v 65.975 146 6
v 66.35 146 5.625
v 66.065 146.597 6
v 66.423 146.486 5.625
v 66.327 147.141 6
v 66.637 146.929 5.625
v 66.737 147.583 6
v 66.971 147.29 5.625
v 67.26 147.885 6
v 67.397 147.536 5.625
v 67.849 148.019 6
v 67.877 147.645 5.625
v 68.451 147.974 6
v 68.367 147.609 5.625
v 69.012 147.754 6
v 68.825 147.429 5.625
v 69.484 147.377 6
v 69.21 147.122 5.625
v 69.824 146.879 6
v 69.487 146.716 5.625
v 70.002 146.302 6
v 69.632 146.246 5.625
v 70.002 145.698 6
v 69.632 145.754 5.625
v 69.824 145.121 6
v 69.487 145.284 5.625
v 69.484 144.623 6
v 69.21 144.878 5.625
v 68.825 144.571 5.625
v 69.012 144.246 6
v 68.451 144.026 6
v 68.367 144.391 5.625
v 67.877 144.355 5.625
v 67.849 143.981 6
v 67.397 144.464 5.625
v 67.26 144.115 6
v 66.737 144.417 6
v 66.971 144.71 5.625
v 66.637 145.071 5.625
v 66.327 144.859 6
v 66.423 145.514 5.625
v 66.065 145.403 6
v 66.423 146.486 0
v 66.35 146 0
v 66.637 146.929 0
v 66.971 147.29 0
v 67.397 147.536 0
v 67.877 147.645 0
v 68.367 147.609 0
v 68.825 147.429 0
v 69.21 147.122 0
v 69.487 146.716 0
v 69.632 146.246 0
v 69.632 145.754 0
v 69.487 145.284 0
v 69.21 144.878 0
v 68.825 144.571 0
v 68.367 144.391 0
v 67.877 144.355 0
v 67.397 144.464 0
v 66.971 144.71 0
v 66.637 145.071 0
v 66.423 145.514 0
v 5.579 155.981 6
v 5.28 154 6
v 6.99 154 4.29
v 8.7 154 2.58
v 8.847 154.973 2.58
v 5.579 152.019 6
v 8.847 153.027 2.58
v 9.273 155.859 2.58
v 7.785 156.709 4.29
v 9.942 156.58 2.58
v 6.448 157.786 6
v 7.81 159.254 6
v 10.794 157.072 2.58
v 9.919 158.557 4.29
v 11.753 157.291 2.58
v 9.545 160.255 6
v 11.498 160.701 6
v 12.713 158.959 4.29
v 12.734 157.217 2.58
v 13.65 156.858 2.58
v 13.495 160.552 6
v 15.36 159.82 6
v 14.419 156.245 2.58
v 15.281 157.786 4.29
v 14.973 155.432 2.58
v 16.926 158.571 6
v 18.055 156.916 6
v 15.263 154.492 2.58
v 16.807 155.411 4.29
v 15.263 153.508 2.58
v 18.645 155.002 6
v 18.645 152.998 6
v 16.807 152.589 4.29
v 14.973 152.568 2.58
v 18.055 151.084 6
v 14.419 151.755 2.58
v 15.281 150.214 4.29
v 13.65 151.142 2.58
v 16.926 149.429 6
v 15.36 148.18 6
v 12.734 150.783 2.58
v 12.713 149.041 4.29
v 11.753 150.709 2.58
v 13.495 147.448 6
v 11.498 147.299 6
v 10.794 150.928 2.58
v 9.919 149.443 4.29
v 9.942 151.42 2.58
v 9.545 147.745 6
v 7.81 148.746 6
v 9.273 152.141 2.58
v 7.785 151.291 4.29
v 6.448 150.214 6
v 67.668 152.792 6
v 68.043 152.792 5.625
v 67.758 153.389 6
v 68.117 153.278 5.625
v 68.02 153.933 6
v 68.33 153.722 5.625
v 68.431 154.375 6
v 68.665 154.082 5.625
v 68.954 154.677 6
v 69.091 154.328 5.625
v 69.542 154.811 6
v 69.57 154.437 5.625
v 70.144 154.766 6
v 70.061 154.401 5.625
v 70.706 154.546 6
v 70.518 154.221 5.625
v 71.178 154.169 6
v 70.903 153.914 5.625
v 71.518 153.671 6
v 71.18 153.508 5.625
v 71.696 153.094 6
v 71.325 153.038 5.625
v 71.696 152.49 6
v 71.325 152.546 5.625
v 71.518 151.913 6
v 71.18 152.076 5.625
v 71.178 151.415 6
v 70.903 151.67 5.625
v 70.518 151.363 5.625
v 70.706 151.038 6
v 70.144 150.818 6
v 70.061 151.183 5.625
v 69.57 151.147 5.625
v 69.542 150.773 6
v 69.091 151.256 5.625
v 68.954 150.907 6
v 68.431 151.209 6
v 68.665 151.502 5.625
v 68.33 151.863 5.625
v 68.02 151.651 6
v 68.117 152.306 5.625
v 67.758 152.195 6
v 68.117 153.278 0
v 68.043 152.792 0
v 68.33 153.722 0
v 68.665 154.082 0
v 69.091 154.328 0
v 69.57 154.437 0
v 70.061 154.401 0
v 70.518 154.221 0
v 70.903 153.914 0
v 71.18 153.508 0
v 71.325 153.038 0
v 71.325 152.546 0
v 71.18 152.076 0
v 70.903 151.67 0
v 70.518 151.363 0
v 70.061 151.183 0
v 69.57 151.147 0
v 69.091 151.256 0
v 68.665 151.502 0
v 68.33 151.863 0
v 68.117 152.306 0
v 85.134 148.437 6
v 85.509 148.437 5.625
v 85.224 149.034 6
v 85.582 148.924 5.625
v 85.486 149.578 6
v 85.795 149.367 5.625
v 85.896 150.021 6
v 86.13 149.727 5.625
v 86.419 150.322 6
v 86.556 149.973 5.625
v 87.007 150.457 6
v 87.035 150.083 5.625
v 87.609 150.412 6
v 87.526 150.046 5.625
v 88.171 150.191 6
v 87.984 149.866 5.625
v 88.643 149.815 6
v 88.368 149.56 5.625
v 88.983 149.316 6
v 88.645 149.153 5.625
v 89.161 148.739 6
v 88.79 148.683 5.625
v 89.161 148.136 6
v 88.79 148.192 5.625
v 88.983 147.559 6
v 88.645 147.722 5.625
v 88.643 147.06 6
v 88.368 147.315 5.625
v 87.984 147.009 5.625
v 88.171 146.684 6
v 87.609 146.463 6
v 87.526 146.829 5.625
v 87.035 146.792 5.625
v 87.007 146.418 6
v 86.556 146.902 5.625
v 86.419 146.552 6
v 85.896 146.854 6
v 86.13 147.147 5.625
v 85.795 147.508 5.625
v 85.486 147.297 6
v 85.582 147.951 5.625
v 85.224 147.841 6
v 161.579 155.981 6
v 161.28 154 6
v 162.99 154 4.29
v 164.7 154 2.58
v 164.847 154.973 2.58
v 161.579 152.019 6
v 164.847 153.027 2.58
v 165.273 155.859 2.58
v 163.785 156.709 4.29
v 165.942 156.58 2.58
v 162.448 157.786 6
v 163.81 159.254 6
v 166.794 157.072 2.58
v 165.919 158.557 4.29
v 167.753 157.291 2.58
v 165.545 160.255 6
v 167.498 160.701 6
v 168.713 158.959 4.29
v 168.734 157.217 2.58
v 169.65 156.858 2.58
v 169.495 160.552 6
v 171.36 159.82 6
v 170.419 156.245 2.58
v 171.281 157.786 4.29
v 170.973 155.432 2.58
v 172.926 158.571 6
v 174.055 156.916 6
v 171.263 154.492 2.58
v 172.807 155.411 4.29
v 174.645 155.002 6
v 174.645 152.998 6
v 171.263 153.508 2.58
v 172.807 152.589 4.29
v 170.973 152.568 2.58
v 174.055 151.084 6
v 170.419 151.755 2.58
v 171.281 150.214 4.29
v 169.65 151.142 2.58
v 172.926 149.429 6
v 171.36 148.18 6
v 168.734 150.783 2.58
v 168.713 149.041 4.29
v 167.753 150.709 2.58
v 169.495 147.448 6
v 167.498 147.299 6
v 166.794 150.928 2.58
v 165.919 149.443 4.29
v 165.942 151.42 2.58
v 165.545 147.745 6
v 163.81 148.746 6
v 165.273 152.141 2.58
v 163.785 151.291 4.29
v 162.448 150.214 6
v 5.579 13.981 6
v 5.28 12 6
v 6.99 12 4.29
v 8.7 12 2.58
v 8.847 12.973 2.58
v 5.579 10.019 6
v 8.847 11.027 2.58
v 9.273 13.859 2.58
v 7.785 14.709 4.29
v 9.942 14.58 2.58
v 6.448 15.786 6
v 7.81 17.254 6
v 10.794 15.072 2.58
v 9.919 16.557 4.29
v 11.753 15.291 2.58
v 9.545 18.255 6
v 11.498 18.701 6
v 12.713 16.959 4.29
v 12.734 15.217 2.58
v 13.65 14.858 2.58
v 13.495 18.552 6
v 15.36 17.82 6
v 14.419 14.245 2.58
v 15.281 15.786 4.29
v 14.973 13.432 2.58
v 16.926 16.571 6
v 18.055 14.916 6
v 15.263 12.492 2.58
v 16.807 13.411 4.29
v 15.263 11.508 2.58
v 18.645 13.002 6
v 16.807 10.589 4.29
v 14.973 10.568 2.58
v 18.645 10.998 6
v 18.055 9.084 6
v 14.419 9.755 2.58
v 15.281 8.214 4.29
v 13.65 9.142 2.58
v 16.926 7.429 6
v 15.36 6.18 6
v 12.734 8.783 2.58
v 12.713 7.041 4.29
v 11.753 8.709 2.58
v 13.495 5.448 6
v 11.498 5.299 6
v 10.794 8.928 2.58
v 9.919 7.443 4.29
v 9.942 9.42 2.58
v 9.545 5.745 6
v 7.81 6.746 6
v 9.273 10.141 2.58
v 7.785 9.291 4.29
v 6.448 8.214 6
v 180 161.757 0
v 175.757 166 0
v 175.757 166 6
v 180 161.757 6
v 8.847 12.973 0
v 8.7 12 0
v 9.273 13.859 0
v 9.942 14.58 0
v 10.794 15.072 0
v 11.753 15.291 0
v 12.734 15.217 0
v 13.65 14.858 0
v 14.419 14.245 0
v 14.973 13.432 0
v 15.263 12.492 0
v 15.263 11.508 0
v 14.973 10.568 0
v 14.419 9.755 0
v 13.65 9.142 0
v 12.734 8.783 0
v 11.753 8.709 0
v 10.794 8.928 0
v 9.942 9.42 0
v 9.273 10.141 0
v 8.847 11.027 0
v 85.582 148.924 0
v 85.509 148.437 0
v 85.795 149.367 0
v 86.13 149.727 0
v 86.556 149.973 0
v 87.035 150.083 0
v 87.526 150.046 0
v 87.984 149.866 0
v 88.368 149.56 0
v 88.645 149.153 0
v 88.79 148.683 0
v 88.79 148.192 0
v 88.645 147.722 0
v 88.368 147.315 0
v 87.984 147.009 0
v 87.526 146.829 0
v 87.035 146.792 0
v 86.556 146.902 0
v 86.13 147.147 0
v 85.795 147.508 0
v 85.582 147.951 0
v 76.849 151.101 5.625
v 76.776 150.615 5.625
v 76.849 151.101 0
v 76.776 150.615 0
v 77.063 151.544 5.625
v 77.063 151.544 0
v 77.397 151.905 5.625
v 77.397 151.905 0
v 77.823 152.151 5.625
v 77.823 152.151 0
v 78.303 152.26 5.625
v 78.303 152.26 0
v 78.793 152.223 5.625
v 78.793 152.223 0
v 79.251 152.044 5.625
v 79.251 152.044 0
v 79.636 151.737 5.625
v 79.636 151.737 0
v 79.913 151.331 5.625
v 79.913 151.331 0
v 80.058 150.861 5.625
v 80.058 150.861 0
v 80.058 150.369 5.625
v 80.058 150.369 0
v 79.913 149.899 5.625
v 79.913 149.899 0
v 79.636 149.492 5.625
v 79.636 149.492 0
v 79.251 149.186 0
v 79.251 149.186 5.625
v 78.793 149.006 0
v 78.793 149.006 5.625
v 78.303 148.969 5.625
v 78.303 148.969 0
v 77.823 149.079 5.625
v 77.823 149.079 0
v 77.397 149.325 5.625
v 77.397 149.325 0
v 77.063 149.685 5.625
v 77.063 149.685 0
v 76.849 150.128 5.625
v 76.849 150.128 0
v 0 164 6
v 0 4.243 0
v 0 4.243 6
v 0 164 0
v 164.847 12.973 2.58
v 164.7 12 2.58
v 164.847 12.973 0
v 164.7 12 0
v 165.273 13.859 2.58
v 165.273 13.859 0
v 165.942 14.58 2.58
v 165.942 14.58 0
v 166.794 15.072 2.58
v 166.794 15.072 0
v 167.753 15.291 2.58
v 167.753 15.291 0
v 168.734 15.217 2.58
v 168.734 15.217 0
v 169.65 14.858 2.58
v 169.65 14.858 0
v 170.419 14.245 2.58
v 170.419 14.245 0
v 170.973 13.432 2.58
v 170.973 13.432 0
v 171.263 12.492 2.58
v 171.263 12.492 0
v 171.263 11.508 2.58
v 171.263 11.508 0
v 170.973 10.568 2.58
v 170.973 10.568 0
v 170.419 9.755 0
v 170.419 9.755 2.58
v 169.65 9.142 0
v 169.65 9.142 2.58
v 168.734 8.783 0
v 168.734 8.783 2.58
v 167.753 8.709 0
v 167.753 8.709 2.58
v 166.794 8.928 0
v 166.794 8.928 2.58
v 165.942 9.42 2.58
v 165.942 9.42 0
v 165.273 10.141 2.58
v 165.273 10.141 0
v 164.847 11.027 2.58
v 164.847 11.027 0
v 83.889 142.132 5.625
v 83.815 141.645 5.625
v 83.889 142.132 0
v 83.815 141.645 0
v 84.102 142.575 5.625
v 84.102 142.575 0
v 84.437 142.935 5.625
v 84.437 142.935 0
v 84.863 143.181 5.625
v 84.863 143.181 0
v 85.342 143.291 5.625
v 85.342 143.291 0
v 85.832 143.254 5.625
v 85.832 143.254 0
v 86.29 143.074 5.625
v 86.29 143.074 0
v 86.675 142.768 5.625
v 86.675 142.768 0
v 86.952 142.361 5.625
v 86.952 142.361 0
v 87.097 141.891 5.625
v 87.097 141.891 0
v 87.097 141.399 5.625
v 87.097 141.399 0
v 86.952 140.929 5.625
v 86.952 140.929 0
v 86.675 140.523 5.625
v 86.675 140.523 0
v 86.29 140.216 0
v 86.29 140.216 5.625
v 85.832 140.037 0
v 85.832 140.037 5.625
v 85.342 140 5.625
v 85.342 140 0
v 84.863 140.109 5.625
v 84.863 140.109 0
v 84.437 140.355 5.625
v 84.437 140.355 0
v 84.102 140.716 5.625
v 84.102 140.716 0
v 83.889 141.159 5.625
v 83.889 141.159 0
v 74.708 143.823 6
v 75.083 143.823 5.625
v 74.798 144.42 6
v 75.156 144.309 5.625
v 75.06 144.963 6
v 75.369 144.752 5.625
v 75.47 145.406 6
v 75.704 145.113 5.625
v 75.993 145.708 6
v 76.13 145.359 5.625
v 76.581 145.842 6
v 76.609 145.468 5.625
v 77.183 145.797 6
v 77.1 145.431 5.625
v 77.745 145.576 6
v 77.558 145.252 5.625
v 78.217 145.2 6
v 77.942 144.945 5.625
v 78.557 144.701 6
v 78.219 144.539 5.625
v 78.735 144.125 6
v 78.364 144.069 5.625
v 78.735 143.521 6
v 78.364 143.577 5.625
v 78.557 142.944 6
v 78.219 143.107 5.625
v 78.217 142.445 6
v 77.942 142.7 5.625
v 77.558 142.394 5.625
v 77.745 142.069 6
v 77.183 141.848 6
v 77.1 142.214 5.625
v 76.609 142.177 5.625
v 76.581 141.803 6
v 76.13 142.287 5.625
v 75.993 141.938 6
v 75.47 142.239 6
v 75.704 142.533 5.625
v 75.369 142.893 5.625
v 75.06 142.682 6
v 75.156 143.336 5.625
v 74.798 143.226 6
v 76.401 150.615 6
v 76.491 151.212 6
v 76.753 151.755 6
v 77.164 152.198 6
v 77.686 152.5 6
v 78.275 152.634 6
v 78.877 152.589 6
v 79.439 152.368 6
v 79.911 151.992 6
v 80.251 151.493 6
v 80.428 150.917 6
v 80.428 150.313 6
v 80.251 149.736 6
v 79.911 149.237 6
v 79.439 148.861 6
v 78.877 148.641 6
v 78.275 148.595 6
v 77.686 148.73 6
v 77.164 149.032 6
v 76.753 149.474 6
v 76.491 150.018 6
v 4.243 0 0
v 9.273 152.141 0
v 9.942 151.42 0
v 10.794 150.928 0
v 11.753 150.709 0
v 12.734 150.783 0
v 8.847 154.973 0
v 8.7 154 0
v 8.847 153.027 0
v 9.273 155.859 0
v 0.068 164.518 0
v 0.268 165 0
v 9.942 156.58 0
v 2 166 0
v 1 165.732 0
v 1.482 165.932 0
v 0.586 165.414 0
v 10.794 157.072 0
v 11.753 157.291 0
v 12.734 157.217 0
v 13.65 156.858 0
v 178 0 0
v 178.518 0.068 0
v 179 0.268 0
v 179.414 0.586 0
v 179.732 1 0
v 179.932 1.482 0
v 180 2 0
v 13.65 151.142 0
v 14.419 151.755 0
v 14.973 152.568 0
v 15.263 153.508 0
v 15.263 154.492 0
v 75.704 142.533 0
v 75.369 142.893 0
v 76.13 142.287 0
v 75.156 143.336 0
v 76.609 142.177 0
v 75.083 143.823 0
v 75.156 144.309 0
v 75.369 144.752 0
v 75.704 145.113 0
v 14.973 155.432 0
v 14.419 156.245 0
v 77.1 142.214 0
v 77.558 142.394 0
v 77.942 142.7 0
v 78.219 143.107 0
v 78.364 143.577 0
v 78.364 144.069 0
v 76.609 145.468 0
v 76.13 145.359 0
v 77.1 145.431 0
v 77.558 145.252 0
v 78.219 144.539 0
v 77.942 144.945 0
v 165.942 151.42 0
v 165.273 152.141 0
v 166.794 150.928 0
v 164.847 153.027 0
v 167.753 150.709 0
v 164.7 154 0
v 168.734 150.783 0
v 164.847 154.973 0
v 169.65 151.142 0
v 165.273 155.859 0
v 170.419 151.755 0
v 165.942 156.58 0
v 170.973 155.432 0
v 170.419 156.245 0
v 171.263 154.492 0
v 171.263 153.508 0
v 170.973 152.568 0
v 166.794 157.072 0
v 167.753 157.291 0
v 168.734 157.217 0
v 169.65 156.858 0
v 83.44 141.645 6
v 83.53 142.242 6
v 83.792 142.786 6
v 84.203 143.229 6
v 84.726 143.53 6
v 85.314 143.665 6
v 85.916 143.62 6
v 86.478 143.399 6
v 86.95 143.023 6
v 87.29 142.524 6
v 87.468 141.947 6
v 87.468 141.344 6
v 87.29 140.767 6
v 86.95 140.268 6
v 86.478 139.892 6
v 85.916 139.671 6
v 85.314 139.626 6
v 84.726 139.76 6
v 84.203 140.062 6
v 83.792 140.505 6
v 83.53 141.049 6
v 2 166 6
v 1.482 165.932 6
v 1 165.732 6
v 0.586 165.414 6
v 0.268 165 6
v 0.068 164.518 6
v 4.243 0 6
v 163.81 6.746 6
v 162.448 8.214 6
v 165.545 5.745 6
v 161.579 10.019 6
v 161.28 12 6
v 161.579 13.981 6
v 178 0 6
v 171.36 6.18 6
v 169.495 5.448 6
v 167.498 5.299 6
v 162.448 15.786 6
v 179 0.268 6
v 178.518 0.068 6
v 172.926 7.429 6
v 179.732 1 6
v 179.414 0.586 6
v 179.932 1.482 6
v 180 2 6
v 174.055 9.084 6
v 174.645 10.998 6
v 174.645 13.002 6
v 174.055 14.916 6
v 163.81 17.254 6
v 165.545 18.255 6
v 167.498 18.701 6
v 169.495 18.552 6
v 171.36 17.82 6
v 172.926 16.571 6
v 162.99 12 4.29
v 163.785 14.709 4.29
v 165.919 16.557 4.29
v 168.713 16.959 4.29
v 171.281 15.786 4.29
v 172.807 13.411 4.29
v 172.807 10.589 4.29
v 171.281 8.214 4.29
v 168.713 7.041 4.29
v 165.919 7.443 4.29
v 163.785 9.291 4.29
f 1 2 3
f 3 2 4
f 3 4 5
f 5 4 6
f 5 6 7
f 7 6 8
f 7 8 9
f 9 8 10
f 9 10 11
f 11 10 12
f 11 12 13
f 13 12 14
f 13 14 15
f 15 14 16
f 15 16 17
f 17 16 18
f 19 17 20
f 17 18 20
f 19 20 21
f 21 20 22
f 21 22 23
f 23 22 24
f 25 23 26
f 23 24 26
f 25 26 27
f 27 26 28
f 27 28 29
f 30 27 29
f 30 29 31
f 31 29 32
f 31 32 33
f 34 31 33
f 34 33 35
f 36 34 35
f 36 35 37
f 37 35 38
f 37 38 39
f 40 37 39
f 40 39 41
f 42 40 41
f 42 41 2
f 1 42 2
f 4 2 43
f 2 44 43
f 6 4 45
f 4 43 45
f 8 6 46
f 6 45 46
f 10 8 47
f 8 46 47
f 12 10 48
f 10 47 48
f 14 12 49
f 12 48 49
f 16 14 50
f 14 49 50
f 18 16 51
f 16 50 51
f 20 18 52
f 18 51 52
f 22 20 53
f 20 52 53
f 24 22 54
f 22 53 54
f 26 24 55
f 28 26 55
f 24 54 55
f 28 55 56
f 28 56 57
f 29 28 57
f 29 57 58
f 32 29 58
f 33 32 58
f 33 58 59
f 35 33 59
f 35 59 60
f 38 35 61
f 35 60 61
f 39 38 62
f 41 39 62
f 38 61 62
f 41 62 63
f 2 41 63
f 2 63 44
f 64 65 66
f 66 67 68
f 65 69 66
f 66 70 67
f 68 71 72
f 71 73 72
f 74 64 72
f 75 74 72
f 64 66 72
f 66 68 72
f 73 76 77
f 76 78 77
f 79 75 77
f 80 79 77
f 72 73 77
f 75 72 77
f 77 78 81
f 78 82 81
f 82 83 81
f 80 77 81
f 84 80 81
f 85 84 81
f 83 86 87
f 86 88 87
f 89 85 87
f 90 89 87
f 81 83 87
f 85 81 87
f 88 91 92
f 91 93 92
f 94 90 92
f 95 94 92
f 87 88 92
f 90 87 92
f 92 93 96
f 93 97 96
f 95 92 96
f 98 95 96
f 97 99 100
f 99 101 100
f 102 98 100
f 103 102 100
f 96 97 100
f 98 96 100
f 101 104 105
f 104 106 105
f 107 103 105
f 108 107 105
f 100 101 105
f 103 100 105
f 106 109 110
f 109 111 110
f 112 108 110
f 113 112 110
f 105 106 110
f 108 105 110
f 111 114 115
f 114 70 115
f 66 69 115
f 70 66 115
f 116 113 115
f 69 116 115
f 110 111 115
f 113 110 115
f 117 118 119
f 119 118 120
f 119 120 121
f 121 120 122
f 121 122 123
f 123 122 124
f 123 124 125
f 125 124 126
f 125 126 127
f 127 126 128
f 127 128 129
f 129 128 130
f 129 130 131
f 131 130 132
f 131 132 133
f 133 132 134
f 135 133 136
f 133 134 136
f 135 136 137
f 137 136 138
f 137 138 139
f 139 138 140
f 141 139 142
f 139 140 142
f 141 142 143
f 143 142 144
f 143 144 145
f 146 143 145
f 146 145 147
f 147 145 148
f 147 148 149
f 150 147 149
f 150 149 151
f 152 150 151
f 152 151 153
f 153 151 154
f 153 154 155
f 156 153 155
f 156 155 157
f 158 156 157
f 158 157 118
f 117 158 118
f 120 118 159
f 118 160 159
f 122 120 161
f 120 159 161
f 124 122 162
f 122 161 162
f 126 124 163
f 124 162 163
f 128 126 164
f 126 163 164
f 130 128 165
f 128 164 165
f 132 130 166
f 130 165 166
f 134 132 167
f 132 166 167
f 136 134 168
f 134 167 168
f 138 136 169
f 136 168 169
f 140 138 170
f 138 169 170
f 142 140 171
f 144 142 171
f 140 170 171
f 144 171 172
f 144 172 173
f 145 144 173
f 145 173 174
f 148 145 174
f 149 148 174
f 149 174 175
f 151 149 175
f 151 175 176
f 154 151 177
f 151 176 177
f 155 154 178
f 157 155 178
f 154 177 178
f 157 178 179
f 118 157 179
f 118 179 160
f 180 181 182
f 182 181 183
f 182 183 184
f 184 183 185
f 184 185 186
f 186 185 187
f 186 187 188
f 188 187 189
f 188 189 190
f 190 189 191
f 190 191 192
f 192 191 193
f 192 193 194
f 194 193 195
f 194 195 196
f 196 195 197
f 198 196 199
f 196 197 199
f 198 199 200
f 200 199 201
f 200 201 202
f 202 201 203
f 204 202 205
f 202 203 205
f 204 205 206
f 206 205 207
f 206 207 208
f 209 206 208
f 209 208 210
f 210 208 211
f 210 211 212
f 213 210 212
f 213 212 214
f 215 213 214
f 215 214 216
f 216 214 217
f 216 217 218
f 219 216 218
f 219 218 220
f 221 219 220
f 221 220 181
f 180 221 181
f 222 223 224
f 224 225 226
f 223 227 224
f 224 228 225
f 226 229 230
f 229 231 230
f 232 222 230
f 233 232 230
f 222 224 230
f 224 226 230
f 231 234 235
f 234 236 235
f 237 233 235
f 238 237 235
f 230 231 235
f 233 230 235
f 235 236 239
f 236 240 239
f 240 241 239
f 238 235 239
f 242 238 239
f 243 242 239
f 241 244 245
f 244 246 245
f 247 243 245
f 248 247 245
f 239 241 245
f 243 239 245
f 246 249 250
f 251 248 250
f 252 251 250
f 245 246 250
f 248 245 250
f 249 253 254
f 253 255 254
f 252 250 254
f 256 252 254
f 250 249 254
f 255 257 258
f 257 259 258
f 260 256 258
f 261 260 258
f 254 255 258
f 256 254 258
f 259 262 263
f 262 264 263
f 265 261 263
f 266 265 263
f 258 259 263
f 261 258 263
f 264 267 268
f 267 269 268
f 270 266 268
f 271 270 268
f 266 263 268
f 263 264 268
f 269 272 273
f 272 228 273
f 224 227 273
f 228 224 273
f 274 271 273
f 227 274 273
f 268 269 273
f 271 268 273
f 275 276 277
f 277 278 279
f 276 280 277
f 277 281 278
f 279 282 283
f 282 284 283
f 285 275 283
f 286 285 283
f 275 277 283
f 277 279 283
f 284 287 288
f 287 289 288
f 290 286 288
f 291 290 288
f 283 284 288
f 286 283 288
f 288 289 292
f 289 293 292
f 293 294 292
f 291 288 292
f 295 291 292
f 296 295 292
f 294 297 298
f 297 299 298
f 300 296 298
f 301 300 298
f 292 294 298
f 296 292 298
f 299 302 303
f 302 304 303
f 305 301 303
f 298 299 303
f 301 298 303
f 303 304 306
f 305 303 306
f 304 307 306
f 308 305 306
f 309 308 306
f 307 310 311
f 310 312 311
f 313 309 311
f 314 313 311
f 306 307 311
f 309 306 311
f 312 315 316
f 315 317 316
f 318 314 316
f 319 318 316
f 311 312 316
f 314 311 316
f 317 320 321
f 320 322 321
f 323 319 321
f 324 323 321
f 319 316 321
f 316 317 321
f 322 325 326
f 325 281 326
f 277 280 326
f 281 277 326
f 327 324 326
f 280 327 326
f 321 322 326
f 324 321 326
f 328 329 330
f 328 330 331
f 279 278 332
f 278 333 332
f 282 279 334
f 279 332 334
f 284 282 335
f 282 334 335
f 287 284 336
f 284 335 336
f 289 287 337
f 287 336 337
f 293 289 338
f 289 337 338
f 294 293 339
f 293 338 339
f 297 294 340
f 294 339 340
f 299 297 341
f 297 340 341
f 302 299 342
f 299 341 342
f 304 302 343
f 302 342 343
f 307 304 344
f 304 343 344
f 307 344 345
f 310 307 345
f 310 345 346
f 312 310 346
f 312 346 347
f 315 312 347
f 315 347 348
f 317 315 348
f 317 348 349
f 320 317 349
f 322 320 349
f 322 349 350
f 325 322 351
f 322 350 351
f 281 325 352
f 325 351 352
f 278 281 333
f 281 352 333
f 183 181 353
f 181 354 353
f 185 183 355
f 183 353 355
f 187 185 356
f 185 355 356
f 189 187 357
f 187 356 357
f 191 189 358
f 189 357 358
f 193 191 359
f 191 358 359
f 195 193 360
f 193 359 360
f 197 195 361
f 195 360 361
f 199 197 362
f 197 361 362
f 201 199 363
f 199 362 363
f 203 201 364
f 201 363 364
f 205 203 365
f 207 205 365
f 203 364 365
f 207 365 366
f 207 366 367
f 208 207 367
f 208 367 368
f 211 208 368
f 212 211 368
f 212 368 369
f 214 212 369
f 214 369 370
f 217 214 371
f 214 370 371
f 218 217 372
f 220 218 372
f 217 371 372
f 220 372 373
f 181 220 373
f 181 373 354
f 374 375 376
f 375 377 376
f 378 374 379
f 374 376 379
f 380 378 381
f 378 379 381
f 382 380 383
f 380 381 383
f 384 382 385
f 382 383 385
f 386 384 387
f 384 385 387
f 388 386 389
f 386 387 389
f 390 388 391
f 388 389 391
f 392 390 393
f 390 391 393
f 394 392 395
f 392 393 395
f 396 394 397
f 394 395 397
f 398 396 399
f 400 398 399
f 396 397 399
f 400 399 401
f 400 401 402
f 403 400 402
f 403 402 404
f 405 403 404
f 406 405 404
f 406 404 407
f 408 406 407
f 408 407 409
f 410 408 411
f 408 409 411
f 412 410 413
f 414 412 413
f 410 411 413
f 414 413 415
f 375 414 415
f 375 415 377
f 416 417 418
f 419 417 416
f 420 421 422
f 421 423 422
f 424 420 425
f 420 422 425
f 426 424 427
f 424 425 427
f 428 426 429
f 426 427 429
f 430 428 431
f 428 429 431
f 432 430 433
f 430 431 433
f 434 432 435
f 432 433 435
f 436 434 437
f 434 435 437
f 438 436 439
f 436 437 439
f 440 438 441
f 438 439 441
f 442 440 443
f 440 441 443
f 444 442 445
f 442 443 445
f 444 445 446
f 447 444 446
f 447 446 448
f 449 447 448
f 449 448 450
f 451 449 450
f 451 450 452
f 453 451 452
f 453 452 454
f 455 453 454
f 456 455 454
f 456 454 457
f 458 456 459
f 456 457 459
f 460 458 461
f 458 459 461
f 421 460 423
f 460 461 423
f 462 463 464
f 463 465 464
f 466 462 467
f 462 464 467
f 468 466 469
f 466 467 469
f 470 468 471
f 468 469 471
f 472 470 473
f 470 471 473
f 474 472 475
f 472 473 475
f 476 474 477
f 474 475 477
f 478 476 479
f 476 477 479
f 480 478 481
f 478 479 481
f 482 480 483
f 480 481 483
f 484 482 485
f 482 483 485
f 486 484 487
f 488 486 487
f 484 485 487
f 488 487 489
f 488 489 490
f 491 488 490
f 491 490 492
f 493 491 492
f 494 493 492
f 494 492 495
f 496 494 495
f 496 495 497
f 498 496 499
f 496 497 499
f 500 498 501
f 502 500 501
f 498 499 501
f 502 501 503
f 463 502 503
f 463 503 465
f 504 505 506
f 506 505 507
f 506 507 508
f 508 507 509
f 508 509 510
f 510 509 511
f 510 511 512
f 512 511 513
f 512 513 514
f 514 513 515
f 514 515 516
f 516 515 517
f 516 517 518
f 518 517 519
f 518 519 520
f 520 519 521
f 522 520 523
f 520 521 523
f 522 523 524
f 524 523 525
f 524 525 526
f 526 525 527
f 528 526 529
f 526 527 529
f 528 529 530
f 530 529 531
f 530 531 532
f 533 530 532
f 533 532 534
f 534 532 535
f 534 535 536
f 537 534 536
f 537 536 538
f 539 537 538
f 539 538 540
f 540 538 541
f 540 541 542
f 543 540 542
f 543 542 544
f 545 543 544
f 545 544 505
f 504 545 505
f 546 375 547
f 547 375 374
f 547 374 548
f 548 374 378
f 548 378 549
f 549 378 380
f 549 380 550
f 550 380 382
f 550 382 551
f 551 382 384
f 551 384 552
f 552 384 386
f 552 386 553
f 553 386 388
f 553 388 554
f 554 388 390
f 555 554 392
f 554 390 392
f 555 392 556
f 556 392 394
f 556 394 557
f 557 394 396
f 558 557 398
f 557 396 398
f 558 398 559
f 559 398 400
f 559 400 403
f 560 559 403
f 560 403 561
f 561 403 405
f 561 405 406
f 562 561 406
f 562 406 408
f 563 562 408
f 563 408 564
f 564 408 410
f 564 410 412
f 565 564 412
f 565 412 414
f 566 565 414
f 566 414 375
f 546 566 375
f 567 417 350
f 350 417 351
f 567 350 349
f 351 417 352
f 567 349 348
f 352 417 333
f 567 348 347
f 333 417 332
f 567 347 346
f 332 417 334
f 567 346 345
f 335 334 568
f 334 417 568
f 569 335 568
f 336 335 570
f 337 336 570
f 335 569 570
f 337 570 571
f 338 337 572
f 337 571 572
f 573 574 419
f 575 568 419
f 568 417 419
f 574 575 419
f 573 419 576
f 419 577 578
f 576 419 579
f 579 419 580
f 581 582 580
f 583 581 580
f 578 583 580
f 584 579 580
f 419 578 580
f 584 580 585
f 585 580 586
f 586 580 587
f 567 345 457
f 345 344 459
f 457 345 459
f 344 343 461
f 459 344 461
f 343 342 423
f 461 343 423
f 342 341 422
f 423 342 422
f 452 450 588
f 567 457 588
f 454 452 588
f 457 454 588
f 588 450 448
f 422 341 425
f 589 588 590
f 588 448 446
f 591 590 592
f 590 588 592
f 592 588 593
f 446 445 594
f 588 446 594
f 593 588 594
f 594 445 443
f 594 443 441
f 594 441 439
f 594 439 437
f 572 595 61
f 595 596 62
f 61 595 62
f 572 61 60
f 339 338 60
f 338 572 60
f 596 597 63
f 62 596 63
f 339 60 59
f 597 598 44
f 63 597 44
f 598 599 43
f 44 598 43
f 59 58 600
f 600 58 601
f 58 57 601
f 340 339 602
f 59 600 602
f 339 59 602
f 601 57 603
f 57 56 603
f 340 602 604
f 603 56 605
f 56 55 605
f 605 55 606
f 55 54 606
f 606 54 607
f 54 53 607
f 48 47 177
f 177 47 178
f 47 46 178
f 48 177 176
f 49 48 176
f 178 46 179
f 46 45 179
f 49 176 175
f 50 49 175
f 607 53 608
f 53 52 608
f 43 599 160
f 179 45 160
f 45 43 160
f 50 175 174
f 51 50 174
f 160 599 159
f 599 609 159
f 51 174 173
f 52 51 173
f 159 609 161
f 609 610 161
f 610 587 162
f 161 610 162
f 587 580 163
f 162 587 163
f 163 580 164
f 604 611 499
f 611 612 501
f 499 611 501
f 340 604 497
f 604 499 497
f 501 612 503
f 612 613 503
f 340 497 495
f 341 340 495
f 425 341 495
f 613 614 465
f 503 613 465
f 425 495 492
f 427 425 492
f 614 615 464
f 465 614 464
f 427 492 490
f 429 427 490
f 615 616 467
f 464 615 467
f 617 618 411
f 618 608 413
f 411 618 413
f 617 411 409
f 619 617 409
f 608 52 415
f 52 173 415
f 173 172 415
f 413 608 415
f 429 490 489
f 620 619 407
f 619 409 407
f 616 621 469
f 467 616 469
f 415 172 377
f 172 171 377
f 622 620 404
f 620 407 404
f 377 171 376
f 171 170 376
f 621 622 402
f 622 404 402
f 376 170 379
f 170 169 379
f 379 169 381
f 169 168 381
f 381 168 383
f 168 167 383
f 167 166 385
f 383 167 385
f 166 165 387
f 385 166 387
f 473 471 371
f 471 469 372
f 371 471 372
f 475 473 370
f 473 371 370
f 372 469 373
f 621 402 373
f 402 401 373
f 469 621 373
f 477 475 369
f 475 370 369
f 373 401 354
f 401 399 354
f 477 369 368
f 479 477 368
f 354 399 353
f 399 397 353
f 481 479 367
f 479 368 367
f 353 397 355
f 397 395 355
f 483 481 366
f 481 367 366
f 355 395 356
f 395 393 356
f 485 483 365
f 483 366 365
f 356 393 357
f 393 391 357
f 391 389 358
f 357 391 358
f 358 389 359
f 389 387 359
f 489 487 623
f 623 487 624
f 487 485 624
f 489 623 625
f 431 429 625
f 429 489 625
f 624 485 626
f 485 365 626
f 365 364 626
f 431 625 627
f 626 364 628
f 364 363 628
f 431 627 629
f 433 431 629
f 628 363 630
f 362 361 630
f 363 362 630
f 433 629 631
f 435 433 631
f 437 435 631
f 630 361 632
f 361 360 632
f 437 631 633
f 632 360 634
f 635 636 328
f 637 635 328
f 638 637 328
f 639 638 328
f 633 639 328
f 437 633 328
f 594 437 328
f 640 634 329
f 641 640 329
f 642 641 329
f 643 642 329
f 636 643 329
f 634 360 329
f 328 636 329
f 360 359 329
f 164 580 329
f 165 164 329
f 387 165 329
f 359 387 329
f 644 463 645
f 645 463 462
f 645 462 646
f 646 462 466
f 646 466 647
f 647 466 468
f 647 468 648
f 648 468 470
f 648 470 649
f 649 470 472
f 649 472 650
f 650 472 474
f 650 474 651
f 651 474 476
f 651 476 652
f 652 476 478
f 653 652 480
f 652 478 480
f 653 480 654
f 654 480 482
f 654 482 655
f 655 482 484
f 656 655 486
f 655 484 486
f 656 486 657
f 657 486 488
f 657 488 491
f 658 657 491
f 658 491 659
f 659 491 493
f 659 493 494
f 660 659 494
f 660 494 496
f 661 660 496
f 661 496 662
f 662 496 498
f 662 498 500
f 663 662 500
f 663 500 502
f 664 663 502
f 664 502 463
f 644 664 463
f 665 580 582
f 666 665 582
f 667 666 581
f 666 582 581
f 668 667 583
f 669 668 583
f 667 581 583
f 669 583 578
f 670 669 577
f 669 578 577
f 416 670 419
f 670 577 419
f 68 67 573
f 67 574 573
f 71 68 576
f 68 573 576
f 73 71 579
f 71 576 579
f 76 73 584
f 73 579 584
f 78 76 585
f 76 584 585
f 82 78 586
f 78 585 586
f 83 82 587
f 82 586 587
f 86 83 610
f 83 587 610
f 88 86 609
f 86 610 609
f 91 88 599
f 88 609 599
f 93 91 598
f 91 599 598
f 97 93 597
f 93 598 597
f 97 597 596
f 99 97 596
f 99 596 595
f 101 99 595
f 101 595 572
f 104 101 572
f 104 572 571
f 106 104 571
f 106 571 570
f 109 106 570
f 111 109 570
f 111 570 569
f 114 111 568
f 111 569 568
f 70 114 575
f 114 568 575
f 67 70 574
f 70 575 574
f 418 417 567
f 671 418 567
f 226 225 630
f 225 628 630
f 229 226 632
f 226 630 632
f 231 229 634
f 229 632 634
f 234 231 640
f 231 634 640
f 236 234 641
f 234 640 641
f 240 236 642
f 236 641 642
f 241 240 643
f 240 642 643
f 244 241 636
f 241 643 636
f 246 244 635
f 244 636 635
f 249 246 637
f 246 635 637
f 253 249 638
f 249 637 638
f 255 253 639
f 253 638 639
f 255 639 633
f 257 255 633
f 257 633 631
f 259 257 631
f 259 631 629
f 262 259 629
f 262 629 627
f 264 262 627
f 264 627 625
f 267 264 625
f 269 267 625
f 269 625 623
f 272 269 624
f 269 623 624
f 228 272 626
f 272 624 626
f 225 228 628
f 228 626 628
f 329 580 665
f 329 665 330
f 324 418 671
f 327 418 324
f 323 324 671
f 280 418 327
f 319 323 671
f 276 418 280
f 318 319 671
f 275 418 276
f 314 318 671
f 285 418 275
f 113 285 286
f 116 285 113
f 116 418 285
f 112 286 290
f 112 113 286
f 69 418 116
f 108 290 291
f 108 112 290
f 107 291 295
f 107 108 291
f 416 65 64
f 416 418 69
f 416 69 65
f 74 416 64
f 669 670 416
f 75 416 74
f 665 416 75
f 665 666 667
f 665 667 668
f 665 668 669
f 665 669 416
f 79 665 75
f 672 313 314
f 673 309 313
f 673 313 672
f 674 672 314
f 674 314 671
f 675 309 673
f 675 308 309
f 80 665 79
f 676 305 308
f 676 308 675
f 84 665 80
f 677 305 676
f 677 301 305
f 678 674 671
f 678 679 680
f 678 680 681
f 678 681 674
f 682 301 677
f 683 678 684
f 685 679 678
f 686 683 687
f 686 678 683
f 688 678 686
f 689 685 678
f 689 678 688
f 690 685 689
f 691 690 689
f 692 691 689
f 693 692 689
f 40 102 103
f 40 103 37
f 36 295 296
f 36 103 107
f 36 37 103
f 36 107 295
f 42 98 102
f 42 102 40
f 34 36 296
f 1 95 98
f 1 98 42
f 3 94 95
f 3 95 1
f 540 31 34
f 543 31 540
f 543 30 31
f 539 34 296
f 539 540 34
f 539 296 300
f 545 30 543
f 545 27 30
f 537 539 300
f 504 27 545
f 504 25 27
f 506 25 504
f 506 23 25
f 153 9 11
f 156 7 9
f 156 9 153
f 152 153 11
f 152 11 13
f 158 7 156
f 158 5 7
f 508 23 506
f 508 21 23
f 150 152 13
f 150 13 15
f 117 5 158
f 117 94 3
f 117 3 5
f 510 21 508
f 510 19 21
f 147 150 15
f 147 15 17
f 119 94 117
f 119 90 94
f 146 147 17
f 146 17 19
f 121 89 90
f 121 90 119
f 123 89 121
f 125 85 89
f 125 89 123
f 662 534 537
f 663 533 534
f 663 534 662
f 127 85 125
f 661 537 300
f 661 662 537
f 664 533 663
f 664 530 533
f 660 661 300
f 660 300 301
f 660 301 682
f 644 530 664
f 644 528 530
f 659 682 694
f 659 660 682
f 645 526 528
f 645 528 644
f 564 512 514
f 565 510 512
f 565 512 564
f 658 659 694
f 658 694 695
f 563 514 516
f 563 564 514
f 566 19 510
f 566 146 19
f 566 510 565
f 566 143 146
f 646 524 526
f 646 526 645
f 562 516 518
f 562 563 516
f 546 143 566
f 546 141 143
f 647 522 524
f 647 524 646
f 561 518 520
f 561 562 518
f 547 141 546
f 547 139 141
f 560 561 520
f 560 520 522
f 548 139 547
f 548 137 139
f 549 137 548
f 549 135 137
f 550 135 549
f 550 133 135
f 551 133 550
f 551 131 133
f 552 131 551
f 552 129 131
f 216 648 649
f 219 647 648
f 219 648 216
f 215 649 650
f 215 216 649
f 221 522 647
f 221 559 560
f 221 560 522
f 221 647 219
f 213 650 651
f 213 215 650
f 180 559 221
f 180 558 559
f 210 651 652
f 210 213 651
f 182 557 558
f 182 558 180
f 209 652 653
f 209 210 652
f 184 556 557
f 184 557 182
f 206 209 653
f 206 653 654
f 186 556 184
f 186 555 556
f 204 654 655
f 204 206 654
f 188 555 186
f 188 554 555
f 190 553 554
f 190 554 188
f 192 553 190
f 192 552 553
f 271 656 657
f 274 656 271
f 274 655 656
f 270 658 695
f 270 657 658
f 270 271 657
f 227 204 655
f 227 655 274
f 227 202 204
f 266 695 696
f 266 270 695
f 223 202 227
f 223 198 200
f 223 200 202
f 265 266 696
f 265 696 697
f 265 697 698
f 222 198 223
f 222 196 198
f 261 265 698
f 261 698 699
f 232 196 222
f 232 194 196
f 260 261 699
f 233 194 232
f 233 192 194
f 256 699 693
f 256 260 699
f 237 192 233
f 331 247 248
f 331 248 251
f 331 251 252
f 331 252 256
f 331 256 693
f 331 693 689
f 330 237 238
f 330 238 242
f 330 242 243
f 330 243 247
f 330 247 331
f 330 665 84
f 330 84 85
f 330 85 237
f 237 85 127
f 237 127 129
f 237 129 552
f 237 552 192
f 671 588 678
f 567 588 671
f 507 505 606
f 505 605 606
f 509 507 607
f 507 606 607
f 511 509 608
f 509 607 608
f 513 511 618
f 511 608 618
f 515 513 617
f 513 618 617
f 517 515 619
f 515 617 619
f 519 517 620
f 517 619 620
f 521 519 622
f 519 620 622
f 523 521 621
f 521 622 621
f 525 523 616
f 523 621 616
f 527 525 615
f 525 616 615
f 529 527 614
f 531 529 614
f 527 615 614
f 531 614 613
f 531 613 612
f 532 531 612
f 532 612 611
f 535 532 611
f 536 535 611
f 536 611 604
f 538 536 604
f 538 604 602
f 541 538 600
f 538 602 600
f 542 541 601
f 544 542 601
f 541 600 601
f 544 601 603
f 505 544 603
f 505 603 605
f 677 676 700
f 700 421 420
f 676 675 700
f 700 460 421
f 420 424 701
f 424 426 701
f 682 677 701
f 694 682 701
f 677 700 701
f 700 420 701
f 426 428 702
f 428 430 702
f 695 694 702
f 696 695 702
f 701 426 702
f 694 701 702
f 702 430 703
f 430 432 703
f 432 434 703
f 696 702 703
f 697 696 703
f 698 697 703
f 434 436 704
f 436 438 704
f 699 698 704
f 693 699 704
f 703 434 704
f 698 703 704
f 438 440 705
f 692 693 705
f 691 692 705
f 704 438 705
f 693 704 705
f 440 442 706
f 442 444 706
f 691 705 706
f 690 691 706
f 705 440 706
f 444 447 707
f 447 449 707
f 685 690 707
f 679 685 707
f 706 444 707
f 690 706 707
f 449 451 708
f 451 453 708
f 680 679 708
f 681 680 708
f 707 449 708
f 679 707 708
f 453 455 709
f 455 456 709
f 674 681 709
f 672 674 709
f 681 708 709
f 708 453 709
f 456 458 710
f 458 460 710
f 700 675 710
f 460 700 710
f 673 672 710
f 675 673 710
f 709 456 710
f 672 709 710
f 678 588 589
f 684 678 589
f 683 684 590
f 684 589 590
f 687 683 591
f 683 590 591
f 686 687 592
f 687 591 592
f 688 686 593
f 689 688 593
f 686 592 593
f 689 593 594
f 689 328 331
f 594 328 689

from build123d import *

# Parameters (mm, degrees)
PAD_DEPTH           = 6
HOLE_D              = 6.6
HOLE_DEPTH          = 25
HOLE_CSINK_D        = 13.44
HOLE_CSINK_ANGLE    = 90
HOLE001_D           = 3.3
HOLE001_CSINK_D     = 4.05
HOLE001_CSINK_ANGLE = 90


with BuildPart() as part:
    # Sketch → Pad (new body)
    with BuildSketch(Plane.XY):
        with BuildLine():
            Line((0, 4.242641), (4.242641, 0))
            Line((177.999997, 0), (4.242641, 0))
            ThreePointArc((177.999997, 0), (179.414214, 0.585787), (180, 2.000004))
            Line((180, 161.757359), (180, 2.000004))
            Line((175.757359, 166), (180, 161.757359))
            Line((2.000009, 166), (175.757359, 166))
            ThreePointArc((2.000009, 166), (0.585793, 165.414221), (0, 164.000011))
            Line((0, 4.242641), (0, 164.000011))
        make_face()
    extrude(amount=PAD_DEPTH)

    # Hole
    with Locations(Plane.XY.offset(6)):
        with Locations((12, 154), (168, 154), (168, 12), (12, 12)):
            CounterSinkHole(HOLE_D / 2, HOLE_CSINK_D / 2, depth=HOLE_DEPTH, counter_sink_angle=HOLE_CSINK_ANGLE)

    # Hole001 (through all)
    with Locations(Plane.XY.offset(6)):
        with Locations((69.693453, 152.79207), (78.426115, 150.614773), (87.158776, 148.437476), (68, 146), (76.732662, 143.822703), (85.465323, 141.645406)):
            CounterSinkHole(HOLE001_D / 2, HOLE001_CSINK_D / 2, counter_sink_angle=HOLE001_CSINK_ANGLE)


solid = part.part
